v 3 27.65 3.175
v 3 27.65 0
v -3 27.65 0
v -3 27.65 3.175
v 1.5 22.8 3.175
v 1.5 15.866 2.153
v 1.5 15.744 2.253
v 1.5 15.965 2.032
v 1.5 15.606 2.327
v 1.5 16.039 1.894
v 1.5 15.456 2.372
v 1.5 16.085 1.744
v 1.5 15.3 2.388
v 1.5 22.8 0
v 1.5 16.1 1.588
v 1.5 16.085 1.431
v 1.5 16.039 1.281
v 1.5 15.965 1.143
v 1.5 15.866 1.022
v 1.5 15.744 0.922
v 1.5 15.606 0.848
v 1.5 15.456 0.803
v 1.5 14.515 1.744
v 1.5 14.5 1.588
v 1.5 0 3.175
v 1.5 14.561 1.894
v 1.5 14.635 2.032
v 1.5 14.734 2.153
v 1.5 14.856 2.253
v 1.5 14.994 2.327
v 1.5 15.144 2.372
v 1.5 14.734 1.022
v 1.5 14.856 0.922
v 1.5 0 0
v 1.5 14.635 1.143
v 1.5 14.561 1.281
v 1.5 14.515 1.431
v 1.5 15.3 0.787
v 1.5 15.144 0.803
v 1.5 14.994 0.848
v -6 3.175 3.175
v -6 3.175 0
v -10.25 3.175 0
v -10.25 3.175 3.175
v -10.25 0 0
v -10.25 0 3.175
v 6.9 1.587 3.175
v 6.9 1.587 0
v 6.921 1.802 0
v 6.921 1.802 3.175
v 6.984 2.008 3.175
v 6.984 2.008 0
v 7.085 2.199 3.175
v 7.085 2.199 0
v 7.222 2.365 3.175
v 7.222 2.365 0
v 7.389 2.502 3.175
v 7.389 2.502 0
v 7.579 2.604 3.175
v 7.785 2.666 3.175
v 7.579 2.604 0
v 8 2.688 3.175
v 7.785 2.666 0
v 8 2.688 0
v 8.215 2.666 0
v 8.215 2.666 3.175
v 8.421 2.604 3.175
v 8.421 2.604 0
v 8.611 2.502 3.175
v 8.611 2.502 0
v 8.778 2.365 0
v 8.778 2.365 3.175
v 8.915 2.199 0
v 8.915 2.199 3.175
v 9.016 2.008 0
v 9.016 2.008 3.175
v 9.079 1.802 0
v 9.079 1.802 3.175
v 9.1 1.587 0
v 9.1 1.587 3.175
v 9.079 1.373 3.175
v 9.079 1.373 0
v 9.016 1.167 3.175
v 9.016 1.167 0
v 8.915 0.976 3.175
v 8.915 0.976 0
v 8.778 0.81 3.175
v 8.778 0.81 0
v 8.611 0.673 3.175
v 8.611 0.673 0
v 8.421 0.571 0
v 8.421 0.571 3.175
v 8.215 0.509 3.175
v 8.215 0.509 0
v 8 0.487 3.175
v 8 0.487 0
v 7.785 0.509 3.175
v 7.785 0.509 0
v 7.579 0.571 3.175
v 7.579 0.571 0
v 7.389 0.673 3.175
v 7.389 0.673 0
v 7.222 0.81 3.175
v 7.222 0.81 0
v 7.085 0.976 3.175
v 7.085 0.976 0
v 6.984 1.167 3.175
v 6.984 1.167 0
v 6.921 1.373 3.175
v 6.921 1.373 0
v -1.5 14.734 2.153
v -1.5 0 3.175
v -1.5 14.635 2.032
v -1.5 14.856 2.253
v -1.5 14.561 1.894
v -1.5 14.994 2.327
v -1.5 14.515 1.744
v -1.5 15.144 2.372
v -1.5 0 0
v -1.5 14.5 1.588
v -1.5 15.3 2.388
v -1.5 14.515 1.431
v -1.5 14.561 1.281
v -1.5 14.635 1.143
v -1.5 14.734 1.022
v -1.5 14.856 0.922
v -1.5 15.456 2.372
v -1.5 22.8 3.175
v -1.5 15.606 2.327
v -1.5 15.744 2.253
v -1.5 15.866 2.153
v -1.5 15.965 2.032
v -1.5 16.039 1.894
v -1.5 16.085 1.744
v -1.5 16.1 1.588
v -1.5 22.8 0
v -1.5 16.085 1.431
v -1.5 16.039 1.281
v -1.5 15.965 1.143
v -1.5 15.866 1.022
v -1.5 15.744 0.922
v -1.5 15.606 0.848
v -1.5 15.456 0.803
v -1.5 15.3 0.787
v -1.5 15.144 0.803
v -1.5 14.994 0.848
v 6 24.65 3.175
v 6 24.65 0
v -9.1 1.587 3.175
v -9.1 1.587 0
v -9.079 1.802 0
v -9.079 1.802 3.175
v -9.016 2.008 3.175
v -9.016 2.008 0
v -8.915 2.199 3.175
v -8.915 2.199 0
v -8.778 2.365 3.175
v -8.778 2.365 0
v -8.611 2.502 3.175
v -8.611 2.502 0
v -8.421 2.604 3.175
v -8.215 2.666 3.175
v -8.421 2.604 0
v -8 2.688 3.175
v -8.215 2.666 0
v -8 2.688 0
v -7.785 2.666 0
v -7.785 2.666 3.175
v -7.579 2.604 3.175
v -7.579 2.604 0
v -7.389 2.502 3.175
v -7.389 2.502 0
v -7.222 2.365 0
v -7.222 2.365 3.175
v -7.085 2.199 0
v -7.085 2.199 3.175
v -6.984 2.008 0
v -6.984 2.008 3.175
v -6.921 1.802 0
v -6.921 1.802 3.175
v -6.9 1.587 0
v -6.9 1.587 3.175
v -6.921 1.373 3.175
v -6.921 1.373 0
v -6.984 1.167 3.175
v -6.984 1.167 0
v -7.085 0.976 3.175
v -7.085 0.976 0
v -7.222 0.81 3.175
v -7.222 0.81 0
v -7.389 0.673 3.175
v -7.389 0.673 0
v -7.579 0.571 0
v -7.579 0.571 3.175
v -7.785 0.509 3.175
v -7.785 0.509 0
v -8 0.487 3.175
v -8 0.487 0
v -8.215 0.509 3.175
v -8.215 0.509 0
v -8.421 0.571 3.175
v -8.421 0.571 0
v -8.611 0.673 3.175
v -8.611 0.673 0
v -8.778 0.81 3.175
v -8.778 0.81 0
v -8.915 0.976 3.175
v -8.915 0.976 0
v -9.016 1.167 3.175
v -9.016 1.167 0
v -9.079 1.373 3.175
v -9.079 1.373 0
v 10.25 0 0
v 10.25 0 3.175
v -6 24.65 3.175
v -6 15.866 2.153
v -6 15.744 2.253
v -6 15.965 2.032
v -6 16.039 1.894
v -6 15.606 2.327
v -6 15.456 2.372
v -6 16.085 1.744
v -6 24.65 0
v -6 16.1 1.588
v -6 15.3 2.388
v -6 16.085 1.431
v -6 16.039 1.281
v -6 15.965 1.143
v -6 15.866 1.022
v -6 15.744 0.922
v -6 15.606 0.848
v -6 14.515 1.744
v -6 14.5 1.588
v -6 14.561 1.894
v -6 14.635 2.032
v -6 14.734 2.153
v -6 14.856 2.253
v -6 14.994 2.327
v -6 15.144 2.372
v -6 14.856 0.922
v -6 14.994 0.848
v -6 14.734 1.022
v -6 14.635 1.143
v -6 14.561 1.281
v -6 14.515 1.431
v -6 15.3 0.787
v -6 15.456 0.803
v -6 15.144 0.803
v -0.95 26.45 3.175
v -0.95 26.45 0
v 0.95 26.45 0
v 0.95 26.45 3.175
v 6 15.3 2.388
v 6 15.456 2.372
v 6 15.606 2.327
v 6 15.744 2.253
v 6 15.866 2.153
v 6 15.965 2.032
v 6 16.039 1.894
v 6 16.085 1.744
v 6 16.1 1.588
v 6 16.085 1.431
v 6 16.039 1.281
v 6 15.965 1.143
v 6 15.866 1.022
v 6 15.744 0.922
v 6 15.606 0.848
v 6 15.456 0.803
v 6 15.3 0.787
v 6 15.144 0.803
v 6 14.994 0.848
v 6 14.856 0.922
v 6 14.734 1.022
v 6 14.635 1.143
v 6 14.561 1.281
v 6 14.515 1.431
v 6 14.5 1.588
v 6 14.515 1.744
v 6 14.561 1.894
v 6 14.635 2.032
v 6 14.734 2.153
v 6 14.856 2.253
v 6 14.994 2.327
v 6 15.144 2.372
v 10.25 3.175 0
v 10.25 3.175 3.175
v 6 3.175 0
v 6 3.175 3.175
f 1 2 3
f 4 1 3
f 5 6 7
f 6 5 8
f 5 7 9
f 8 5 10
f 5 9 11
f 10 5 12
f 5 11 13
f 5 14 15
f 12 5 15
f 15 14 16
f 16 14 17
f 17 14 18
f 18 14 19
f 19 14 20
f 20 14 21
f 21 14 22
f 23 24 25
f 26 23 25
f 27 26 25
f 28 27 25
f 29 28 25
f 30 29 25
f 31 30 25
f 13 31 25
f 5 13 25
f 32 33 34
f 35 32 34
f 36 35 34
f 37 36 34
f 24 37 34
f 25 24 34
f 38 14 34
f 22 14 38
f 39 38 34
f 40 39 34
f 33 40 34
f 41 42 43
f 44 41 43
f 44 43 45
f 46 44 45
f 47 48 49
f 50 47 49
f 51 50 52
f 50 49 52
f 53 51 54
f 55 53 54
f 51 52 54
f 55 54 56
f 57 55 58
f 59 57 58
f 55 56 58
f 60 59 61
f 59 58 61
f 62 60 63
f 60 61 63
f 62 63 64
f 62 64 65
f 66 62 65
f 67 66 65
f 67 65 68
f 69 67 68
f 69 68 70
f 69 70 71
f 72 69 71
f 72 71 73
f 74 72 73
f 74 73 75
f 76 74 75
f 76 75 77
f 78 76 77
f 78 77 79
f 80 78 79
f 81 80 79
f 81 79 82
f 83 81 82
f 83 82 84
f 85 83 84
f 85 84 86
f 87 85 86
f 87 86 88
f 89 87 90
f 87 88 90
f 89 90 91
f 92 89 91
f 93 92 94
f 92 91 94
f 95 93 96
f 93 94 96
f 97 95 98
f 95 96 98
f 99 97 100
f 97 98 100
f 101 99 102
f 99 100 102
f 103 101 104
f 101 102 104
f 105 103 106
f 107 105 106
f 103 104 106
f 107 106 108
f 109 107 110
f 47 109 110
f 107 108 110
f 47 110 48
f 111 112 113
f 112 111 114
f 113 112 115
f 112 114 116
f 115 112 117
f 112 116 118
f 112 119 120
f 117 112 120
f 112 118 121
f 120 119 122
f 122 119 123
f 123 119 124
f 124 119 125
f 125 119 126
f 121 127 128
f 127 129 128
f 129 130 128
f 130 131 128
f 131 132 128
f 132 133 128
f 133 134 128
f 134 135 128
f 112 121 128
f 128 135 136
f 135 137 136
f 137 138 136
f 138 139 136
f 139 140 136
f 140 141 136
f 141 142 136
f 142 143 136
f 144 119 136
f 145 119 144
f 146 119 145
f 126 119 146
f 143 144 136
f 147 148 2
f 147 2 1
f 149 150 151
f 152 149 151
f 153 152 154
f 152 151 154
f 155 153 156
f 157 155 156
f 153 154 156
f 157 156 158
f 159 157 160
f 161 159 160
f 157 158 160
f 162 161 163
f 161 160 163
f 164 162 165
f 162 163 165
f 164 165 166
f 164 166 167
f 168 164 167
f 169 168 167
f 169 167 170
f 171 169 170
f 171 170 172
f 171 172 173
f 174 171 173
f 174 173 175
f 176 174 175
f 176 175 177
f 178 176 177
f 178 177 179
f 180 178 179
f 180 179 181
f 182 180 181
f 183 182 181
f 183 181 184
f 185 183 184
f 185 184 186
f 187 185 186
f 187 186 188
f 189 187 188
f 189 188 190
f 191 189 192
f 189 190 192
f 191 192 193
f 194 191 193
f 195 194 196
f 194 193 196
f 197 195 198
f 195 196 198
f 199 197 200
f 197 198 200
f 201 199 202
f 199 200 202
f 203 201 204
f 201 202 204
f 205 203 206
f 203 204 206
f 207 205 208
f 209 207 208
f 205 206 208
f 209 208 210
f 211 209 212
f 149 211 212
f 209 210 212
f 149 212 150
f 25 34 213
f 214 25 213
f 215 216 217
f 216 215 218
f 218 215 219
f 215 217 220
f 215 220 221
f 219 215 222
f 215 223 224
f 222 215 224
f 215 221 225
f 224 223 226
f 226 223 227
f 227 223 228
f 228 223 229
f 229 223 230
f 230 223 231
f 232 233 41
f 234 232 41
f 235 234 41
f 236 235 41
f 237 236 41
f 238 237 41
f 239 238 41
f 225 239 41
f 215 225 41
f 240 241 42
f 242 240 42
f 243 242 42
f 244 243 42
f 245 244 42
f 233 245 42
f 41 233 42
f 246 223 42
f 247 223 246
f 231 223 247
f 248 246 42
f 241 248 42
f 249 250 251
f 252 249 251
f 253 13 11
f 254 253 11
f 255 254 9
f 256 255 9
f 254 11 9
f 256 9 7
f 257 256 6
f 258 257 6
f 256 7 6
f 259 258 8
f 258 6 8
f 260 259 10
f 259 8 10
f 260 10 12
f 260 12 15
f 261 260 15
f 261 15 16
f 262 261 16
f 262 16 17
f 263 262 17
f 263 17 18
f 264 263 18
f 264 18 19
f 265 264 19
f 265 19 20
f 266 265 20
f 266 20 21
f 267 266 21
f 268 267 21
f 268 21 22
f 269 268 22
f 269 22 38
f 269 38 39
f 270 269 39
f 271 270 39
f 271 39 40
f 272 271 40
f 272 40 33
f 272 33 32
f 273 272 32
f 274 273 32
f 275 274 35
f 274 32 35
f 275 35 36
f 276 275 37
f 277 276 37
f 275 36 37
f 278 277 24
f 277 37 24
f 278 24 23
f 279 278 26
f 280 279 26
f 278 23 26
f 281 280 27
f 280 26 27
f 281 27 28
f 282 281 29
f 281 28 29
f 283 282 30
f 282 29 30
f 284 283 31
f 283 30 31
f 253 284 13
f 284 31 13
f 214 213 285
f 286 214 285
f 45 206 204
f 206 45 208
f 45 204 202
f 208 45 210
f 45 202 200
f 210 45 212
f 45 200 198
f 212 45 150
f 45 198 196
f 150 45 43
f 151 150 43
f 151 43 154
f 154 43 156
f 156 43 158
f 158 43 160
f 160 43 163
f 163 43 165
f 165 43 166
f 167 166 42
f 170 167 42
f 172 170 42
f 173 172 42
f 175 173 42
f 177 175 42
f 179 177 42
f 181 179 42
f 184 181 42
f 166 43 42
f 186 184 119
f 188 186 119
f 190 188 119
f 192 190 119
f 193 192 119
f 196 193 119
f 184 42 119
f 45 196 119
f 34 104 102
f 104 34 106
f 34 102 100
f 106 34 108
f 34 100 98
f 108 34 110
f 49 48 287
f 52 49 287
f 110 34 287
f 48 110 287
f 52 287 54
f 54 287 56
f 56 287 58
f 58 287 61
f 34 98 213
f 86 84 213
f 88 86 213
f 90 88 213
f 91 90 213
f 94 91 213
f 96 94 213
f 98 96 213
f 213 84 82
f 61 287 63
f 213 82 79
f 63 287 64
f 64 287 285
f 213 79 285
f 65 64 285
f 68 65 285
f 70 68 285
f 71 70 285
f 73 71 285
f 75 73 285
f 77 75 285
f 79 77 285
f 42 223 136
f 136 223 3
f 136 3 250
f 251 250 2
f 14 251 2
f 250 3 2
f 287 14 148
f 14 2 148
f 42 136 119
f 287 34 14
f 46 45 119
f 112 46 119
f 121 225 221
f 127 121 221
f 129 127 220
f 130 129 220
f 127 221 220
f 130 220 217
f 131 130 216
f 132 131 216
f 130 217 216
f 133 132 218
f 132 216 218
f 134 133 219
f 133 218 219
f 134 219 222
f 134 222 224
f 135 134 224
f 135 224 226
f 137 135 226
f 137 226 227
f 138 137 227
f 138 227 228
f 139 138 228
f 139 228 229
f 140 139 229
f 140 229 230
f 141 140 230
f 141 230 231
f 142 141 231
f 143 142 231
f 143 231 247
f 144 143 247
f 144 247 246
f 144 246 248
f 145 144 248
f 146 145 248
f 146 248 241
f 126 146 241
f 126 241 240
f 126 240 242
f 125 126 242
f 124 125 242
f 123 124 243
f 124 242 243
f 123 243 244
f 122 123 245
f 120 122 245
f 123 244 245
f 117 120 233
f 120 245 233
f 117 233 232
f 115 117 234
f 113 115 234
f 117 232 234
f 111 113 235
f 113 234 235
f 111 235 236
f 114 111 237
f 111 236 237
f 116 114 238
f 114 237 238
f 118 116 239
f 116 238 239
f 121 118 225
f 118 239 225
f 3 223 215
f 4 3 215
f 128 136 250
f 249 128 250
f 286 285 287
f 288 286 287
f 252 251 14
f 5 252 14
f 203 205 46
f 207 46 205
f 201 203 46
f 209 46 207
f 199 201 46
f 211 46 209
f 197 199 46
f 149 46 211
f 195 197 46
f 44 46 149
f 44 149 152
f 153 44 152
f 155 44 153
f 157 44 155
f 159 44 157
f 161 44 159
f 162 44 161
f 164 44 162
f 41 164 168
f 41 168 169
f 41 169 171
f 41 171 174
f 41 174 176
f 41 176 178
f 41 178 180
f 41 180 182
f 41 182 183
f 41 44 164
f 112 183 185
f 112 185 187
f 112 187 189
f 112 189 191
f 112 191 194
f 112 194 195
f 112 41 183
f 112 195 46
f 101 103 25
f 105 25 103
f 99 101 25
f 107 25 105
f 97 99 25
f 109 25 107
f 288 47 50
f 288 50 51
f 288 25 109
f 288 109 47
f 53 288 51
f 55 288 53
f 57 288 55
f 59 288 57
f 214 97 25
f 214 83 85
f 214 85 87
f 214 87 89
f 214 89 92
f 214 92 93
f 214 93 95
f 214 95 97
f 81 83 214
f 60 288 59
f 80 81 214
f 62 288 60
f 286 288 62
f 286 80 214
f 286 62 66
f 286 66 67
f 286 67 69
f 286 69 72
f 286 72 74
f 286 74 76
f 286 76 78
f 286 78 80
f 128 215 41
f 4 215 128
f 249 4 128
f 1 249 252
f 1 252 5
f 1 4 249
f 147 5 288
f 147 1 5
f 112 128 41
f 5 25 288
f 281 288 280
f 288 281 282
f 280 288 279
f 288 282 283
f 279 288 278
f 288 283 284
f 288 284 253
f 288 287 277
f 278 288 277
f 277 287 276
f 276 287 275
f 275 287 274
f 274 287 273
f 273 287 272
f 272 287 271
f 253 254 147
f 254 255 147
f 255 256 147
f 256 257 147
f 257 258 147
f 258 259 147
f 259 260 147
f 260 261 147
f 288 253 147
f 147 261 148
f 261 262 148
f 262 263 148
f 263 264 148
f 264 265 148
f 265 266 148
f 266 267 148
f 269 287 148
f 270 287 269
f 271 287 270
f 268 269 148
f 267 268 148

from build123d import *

# Parameters (mm, degrees)
BOSS_EXTRUDE1_DEPTH         = 3.175
CHAMFER1_SIZE               = 3
TAP_DRILL_FOR_M2X0_4_TAP1_D = 1.6
M2_CLEARANCE_HOLE1_D        = 2.2


with BuildPart() as part:
    # Sketch1 → Boss-Extrude1 (new body)
    with BuildSketch(Plane.XY):
        Polygon((6, 27.65), (-6, 27.65), (-6, 3.175), (-10.25, 3.175), (-10.25, 0), (-1.5, 0), (-1.5, 22.8), (-0.95, 26.45), (0.95, 26.45), (1.5, 22.8), (1.5, 0), (10.25, 0), (10.25, 3.175), (6, 3.175), align=None)
    extrude(amount=BOSS_EXTRUDE1_DEPTH)

    # Chamfer1
    chamfer1_edges = [part.edges().sort_by_distance(p)[0] for p in [
        (-6, 27.65, 1.5875),
        (6, 27.65, 1.5875),
    ]]
    chamfer(chamfer1_edges, length=CHAMFER1_SIZE)

    # Tap Drill for M2x0.4 Tap1 (through all)
    with Locations(Plane(origin=(6, 0, 0), x_dir=(0, 0, -1), z_dir=(1, 0, 0))):
        with Locations((-1.5875, 15.3)):
            Hole(TAP_DRILL_FOR_M2X0_4_TAP1_D / 2)

    # M2 Clearance Hole1 (through all)
    with Locations(Plane.XY.offset(3.175)):
        with Locations((-8, 1.5875), (8, 1.5875)):
            Hole(M2_CLEARANCE_HOLE1_D / 2)


solid = part.part
